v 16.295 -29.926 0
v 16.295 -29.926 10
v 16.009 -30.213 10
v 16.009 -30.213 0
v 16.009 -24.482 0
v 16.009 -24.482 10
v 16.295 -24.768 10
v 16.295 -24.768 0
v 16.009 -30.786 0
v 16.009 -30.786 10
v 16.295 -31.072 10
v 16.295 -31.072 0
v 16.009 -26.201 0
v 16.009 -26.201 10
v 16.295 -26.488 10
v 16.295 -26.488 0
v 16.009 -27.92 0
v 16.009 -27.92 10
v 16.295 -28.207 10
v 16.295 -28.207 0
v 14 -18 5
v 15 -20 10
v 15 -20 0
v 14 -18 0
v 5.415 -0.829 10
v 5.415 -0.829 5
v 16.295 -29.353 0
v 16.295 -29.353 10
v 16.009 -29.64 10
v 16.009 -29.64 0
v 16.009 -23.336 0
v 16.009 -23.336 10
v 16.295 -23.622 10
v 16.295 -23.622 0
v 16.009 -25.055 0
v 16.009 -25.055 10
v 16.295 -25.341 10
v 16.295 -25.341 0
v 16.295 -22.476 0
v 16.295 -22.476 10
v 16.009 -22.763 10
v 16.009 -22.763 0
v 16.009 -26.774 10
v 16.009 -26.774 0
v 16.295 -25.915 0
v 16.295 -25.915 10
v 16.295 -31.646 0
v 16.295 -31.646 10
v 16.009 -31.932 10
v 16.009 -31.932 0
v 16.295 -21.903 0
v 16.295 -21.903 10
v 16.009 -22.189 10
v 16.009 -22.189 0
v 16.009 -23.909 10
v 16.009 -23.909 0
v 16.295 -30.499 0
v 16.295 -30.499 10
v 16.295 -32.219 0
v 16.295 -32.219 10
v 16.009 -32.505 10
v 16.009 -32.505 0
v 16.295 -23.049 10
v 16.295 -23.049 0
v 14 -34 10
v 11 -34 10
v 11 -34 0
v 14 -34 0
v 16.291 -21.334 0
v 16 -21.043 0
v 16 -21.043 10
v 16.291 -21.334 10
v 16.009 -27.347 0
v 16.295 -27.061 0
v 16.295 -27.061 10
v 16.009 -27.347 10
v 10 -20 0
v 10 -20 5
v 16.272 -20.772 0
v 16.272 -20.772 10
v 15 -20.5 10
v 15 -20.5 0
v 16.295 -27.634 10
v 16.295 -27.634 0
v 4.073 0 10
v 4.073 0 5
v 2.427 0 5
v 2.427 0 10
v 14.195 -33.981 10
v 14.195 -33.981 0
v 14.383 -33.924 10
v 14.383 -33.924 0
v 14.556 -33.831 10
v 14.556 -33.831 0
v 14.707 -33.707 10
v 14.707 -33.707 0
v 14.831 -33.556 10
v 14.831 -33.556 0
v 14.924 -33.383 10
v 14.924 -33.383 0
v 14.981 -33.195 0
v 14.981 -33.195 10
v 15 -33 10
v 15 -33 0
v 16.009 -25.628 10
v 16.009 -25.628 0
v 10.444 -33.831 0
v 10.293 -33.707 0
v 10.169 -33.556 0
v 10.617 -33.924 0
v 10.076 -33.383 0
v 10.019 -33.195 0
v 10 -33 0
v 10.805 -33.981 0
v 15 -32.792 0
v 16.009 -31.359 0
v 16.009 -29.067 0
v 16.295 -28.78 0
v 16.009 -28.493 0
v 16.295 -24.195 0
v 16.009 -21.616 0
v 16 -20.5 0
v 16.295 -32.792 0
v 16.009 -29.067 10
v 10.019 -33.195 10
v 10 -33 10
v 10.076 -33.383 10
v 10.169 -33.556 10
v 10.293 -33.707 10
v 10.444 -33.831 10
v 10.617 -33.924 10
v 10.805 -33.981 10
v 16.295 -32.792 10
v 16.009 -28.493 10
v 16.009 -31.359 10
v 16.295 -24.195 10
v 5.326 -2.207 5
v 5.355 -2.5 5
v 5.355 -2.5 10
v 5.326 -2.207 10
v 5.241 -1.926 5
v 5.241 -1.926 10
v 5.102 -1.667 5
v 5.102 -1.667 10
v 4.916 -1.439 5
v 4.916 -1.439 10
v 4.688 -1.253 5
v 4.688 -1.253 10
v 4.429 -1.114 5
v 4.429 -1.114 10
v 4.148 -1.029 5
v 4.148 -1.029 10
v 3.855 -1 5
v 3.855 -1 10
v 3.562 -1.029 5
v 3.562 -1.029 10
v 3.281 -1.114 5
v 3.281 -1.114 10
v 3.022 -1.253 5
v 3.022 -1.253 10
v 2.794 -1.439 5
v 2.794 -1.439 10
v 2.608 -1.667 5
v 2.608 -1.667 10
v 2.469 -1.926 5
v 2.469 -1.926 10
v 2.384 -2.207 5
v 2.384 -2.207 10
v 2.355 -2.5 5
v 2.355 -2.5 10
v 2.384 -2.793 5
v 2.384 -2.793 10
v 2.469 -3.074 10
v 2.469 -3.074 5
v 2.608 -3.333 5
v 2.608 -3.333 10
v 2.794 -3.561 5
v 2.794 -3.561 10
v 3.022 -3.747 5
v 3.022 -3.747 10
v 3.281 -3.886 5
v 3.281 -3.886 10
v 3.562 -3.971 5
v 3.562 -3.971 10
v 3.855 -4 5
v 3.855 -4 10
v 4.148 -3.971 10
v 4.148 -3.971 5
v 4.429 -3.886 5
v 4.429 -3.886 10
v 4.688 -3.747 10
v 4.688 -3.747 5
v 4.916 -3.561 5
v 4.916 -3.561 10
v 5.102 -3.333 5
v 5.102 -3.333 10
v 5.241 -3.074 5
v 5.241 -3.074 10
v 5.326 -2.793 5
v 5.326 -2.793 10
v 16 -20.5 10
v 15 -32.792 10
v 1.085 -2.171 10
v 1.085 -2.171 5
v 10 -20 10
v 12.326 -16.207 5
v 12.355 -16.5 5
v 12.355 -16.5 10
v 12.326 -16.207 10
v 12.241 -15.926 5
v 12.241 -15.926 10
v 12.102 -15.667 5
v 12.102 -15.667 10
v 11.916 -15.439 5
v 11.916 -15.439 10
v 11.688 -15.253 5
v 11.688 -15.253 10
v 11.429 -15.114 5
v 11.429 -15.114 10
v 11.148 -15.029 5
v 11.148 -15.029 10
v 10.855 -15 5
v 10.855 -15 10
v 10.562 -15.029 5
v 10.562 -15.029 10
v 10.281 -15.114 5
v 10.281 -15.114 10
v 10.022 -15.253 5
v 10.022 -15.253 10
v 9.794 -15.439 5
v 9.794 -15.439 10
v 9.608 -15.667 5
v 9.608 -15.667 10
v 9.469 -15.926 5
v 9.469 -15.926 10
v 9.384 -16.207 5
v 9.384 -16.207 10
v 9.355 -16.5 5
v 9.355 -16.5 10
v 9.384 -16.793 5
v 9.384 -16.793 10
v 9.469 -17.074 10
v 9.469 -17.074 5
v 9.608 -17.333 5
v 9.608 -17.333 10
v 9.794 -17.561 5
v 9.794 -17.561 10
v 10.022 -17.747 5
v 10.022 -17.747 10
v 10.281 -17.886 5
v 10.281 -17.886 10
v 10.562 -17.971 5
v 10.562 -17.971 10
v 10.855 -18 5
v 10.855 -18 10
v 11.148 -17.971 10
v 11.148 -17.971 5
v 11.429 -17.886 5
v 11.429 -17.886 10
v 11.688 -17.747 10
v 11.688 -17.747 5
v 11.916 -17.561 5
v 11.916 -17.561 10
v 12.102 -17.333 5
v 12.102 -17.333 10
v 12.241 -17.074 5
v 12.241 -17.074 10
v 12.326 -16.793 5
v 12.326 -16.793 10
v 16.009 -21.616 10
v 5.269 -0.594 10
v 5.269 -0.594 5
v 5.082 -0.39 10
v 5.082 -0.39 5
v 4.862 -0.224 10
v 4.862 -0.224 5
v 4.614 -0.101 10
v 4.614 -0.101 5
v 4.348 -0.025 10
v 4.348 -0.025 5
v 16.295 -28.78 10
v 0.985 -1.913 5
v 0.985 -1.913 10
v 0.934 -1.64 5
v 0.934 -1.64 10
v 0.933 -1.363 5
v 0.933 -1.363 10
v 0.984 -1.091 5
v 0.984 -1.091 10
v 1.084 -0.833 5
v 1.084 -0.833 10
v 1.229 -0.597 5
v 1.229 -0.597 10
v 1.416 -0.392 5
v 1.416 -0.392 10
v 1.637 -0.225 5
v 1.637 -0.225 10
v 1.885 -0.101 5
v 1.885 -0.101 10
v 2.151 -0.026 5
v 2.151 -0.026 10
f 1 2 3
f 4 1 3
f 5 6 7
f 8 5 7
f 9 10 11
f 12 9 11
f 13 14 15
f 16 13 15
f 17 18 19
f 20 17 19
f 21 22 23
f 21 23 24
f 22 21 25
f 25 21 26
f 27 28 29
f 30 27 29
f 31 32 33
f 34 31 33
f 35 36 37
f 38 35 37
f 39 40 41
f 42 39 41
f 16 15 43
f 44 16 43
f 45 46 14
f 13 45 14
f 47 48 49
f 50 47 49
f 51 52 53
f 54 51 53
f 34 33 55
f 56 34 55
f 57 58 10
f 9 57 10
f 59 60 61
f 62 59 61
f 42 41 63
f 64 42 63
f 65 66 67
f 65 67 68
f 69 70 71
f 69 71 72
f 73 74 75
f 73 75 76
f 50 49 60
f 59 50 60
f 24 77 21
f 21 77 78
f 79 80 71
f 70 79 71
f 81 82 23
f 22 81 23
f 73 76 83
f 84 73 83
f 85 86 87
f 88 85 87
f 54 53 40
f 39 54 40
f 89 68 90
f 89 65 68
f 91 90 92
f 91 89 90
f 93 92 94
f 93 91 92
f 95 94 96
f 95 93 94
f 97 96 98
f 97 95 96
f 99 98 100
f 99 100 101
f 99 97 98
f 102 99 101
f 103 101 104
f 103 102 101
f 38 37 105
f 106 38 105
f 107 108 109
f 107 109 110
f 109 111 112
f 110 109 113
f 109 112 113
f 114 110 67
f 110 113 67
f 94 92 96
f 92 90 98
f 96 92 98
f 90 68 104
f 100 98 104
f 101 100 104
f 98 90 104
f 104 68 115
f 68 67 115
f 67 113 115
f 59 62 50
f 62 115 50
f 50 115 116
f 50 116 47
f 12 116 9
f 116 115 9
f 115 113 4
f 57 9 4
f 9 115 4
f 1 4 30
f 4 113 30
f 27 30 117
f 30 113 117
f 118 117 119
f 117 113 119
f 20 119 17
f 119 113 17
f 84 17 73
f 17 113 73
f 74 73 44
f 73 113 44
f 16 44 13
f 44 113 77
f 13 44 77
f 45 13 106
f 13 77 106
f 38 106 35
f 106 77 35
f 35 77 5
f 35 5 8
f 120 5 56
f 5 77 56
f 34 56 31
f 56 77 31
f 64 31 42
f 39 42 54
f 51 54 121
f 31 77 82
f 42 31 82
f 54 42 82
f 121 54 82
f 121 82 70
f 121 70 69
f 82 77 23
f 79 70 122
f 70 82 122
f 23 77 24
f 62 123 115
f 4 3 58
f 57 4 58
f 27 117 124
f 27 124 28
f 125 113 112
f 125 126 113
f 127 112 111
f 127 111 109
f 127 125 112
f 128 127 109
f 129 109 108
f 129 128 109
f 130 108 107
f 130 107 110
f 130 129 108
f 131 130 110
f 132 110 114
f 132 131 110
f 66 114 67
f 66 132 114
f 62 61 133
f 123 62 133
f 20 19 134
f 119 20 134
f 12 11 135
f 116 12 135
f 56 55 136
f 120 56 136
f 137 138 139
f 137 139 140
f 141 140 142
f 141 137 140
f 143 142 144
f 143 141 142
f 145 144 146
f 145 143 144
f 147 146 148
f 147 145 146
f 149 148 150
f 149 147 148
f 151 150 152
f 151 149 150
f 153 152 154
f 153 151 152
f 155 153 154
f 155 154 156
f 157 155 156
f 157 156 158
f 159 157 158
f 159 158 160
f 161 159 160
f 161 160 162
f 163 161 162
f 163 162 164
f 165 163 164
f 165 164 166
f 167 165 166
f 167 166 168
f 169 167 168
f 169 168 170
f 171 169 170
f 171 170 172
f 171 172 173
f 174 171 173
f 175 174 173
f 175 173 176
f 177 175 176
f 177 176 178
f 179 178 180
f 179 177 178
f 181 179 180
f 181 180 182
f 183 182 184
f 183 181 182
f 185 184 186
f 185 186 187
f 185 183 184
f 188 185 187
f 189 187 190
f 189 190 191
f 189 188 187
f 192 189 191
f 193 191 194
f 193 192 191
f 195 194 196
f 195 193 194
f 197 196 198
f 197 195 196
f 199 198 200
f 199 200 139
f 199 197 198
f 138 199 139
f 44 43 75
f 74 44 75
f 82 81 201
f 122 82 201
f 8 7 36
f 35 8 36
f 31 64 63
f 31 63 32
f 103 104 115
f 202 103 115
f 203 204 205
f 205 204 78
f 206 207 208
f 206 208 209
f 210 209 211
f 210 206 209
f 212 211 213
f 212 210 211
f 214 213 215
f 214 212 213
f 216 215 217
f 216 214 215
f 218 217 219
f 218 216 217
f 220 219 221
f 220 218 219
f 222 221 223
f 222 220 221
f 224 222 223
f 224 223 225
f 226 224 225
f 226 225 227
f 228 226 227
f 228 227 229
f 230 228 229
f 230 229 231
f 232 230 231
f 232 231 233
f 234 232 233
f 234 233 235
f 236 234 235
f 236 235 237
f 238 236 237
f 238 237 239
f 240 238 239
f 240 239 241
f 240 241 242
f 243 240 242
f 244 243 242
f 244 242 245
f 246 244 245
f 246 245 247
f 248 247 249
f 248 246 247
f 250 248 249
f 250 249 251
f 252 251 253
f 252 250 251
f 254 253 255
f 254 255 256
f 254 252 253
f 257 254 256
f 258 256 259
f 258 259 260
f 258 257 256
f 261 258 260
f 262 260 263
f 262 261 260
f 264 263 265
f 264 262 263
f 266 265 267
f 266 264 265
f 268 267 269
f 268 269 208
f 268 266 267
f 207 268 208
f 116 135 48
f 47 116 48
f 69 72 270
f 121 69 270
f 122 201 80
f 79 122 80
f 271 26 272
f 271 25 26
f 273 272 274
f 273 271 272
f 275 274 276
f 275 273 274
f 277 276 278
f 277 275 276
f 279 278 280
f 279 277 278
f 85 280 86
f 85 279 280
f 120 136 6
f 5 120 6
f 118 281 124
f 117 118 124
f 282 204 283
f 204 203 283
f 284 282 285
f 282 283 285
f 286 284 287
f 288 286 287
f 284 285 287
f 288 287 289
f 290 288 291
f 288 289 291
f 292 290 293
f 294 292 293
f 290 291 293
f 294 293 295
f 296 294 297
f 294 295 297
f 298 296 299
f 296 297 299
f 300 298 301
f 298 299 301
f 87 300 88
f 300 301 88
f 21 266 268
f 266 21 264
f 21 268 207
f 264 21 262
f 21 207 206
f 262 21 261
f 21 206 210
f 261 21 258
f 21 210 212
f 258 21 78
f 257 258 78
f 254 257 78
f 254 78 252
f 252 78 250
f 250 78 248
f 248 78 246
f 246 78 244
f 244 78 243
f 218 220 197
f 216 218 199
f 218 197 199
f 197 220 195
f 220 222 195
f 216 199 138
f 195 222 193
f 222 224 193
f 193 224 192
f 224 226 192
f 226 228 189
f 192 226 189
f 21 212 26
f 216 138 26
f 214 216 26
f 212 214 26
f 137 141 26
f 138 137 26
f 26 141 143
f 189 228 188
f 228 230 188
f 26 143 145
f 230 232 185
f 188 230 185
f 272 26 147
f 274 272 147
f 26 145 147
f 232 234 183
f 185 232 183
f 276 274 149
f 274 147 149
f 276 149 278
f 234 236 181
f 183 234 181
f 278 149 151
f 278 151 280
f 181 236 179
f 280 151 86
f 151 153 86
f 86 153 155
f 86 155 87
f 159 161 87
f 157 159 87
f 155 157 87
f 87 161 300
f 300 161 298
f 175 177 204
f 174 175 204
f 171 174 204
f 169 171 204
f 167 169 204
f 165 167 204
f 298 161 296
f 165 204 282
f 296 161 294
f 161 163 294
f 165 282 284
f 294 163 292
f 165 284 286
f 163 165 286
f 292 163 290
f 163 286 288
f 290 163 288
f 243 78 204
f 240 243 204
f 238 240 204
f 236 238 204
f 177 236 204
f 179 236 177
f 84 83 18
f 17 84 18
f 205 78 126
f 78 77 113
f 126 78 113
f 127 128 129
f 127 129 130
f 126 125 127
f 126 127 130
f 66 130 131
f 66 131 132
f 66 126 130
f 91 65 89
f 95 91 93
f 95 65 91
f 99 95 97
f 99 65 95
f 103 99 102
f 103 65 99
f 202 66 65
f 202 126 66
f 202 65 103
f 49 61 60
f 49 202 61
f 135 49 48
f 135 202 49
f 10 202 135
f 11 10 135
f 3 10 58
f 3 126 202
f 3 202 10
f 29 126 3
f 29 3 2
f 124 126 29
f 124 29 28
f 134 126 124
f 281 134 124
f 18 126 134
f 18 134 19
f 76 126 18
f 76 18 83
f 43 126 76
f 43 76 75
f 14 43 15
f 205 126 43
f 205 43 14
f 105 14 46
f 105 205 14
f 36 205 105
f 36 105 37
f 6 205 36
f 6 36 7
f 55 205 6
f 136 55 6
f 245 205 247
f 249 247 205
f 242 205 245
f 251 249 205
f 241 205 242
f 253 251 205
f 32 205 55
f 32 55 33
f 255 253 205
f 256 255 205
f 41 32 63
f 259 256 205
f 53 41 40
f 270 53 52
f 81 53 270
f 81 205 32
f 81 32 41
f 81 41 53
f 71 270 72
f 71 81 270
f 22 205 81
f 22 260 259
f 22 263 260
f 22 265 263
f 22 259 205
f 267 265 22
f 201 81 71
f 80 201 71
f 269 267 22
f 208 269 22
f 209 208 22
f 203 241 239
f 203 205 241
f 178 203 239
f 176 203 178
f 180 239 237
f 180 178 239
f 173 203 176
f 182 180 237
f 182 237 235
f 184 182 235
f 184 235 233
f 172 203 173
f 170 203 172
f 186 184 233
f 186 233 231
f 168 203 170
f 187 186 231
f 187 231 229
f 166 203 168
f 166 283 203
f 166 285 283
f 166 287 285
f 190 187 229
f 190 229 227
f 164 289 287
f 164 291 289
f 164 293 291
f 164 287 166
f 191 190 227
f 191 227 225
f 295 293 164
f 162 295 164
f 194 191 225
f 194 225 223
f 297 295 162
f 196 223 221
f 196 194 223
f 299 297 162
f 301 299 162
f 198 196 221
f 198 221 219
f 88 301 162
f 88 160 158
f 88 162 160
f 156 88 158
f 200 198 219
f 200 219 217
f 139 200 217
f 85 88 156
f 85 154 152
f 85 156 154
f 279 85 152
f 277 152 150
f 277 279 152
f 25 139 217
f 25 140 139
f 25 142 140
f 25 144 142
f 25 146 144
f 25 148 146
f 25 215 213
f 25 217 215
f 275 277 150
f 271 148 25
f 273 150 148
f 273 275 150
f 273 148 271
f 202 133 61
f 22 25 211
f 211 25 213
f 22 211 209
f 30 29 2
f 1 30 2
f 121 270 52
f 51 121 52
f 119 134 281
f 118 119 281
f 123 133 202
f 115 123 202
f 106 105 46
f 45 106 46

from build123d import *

# Parameters (mm, degrees)
SKETCH2_R           = 1.5
BOSS_EXTRUDE1_DEPTH = 10
SKETCH3_W           = 5
SKETCH3_H           = 22.360679775
CUT_EXTRUDE1_DEPTH  = 10
FILLET2_R           = 1.5
FILLET3_R           = 1
BOSS_EXTRUDE2_DEPTH = 10


with BuildPart() as part:
    # Sketch2 → Boss-Extrude1 (new body)
    with BuildSketch(Plane.XY):
        Polygon((0, 0), (10, -20), (10, -34), (15, -34), (15, -20), (5, 0), align=None)
        with Locations((3.855019194, -2.5)):
            Circle(SKETCH2_R, mode=Mode.SUBTRACT)
        with Locations((10.855019194, -16.5)):
            Circle(SKETCH2_R, mode=Mode.SUBTRACT)
    extrude(amount=BOSS_EXTRUDE1_DEPTH)

    # Sketch3 → Cut-Extrude1 (cut)
    with BuildSketch(Plane(origin=(0, 0, 0), x_dir=(0, 0, 1), z_dir=(-0.894427191, -0.447213595, 0))):
        with Locations((2.5, -11.180339888)):
            Rectangle(SKETCH3_W, SKETCH3_H)
    extrude(amount=-CUT_EXTRUDE1_DEPTH, mode=Mode.SUBTRACT)

    # Fillet2
    fillet2_edges = [part.edges().sort_by_distance(p)[0] for p in [
        (0, 0, 7.5),
        (5, 0, 7.5),
    ]]
    fillet(fillet2_edges, radius=FILLET2_R)

    # Fillet3
    fillet3_edges = [part.edges().sort_by_distance(p)[0] for p in [
        (15, -34, 5),
        (10, -34, 5),
    ]]
    fillet(fillet3_edges, radius=FILLET3_R)

    # Sketch4 → Boss-Extrude2 (add)
    with BuildSketch(Plane.XY.offset(10)):
        Polygon((15, -20.5), (16, -20.5), (16.271607252, -20.771607252), (16, -21.043214505), (16.290943636, -21.334158141), (16.008789905, -21.616311872), (16.295338588, -21.902860555), (16.008789905, -22.189409238), (16.295338588, -22.475957922), (16.008789905, -22.762506605), (16.295338588, -23.049055289), (16.008789905, -23.335603972), (16.295338588, -23.622152655), (16.008789905, -23.908701339), (16.295338588, -24.195250022), (16.008789905, -24.481798706), (16.295338588, -24.768347389), (16.008789905, -25.054896072), (16.295338588, -25.341444756), (16.008789905, -25.627993439), (16.295338588, -25.914542122), (16.008789905, -26.201090806), (16.295338588, -26.487639489), (16.008789905, -26.774188173), (16.295338588, -27.060736856), (16.008789905, -27.347285539), (16.295338588, -27.633834223), (16.008789905, -27.920382906), (16.295338588, -28.20693159), (16.008789905, -28.493480273), (16.295338588, -28.780028956), (16.008789905, -29.06657764), (16.295338588, -29.353126323), (16.008789905, -29.639675006), (16.295338588, -29.92622369), (16.008789905, -30.212772373), (16.295338588, -30.499321057), (16.008789905, -30.78586974), (16.295338588, -31.072418423), (16.008789905, -31.358967107), (16.295338588, -31.64551579), (16.008789905, -31.932064474), (16.295338588, -32.218613157), (16.008789905, -32.50516184), (16.295338588, -32.791710524), (15, -32.791710524), align=None)
    extrude(amount=-BOSS_EXTRUDE2_DEPTH)


solid = part.part
